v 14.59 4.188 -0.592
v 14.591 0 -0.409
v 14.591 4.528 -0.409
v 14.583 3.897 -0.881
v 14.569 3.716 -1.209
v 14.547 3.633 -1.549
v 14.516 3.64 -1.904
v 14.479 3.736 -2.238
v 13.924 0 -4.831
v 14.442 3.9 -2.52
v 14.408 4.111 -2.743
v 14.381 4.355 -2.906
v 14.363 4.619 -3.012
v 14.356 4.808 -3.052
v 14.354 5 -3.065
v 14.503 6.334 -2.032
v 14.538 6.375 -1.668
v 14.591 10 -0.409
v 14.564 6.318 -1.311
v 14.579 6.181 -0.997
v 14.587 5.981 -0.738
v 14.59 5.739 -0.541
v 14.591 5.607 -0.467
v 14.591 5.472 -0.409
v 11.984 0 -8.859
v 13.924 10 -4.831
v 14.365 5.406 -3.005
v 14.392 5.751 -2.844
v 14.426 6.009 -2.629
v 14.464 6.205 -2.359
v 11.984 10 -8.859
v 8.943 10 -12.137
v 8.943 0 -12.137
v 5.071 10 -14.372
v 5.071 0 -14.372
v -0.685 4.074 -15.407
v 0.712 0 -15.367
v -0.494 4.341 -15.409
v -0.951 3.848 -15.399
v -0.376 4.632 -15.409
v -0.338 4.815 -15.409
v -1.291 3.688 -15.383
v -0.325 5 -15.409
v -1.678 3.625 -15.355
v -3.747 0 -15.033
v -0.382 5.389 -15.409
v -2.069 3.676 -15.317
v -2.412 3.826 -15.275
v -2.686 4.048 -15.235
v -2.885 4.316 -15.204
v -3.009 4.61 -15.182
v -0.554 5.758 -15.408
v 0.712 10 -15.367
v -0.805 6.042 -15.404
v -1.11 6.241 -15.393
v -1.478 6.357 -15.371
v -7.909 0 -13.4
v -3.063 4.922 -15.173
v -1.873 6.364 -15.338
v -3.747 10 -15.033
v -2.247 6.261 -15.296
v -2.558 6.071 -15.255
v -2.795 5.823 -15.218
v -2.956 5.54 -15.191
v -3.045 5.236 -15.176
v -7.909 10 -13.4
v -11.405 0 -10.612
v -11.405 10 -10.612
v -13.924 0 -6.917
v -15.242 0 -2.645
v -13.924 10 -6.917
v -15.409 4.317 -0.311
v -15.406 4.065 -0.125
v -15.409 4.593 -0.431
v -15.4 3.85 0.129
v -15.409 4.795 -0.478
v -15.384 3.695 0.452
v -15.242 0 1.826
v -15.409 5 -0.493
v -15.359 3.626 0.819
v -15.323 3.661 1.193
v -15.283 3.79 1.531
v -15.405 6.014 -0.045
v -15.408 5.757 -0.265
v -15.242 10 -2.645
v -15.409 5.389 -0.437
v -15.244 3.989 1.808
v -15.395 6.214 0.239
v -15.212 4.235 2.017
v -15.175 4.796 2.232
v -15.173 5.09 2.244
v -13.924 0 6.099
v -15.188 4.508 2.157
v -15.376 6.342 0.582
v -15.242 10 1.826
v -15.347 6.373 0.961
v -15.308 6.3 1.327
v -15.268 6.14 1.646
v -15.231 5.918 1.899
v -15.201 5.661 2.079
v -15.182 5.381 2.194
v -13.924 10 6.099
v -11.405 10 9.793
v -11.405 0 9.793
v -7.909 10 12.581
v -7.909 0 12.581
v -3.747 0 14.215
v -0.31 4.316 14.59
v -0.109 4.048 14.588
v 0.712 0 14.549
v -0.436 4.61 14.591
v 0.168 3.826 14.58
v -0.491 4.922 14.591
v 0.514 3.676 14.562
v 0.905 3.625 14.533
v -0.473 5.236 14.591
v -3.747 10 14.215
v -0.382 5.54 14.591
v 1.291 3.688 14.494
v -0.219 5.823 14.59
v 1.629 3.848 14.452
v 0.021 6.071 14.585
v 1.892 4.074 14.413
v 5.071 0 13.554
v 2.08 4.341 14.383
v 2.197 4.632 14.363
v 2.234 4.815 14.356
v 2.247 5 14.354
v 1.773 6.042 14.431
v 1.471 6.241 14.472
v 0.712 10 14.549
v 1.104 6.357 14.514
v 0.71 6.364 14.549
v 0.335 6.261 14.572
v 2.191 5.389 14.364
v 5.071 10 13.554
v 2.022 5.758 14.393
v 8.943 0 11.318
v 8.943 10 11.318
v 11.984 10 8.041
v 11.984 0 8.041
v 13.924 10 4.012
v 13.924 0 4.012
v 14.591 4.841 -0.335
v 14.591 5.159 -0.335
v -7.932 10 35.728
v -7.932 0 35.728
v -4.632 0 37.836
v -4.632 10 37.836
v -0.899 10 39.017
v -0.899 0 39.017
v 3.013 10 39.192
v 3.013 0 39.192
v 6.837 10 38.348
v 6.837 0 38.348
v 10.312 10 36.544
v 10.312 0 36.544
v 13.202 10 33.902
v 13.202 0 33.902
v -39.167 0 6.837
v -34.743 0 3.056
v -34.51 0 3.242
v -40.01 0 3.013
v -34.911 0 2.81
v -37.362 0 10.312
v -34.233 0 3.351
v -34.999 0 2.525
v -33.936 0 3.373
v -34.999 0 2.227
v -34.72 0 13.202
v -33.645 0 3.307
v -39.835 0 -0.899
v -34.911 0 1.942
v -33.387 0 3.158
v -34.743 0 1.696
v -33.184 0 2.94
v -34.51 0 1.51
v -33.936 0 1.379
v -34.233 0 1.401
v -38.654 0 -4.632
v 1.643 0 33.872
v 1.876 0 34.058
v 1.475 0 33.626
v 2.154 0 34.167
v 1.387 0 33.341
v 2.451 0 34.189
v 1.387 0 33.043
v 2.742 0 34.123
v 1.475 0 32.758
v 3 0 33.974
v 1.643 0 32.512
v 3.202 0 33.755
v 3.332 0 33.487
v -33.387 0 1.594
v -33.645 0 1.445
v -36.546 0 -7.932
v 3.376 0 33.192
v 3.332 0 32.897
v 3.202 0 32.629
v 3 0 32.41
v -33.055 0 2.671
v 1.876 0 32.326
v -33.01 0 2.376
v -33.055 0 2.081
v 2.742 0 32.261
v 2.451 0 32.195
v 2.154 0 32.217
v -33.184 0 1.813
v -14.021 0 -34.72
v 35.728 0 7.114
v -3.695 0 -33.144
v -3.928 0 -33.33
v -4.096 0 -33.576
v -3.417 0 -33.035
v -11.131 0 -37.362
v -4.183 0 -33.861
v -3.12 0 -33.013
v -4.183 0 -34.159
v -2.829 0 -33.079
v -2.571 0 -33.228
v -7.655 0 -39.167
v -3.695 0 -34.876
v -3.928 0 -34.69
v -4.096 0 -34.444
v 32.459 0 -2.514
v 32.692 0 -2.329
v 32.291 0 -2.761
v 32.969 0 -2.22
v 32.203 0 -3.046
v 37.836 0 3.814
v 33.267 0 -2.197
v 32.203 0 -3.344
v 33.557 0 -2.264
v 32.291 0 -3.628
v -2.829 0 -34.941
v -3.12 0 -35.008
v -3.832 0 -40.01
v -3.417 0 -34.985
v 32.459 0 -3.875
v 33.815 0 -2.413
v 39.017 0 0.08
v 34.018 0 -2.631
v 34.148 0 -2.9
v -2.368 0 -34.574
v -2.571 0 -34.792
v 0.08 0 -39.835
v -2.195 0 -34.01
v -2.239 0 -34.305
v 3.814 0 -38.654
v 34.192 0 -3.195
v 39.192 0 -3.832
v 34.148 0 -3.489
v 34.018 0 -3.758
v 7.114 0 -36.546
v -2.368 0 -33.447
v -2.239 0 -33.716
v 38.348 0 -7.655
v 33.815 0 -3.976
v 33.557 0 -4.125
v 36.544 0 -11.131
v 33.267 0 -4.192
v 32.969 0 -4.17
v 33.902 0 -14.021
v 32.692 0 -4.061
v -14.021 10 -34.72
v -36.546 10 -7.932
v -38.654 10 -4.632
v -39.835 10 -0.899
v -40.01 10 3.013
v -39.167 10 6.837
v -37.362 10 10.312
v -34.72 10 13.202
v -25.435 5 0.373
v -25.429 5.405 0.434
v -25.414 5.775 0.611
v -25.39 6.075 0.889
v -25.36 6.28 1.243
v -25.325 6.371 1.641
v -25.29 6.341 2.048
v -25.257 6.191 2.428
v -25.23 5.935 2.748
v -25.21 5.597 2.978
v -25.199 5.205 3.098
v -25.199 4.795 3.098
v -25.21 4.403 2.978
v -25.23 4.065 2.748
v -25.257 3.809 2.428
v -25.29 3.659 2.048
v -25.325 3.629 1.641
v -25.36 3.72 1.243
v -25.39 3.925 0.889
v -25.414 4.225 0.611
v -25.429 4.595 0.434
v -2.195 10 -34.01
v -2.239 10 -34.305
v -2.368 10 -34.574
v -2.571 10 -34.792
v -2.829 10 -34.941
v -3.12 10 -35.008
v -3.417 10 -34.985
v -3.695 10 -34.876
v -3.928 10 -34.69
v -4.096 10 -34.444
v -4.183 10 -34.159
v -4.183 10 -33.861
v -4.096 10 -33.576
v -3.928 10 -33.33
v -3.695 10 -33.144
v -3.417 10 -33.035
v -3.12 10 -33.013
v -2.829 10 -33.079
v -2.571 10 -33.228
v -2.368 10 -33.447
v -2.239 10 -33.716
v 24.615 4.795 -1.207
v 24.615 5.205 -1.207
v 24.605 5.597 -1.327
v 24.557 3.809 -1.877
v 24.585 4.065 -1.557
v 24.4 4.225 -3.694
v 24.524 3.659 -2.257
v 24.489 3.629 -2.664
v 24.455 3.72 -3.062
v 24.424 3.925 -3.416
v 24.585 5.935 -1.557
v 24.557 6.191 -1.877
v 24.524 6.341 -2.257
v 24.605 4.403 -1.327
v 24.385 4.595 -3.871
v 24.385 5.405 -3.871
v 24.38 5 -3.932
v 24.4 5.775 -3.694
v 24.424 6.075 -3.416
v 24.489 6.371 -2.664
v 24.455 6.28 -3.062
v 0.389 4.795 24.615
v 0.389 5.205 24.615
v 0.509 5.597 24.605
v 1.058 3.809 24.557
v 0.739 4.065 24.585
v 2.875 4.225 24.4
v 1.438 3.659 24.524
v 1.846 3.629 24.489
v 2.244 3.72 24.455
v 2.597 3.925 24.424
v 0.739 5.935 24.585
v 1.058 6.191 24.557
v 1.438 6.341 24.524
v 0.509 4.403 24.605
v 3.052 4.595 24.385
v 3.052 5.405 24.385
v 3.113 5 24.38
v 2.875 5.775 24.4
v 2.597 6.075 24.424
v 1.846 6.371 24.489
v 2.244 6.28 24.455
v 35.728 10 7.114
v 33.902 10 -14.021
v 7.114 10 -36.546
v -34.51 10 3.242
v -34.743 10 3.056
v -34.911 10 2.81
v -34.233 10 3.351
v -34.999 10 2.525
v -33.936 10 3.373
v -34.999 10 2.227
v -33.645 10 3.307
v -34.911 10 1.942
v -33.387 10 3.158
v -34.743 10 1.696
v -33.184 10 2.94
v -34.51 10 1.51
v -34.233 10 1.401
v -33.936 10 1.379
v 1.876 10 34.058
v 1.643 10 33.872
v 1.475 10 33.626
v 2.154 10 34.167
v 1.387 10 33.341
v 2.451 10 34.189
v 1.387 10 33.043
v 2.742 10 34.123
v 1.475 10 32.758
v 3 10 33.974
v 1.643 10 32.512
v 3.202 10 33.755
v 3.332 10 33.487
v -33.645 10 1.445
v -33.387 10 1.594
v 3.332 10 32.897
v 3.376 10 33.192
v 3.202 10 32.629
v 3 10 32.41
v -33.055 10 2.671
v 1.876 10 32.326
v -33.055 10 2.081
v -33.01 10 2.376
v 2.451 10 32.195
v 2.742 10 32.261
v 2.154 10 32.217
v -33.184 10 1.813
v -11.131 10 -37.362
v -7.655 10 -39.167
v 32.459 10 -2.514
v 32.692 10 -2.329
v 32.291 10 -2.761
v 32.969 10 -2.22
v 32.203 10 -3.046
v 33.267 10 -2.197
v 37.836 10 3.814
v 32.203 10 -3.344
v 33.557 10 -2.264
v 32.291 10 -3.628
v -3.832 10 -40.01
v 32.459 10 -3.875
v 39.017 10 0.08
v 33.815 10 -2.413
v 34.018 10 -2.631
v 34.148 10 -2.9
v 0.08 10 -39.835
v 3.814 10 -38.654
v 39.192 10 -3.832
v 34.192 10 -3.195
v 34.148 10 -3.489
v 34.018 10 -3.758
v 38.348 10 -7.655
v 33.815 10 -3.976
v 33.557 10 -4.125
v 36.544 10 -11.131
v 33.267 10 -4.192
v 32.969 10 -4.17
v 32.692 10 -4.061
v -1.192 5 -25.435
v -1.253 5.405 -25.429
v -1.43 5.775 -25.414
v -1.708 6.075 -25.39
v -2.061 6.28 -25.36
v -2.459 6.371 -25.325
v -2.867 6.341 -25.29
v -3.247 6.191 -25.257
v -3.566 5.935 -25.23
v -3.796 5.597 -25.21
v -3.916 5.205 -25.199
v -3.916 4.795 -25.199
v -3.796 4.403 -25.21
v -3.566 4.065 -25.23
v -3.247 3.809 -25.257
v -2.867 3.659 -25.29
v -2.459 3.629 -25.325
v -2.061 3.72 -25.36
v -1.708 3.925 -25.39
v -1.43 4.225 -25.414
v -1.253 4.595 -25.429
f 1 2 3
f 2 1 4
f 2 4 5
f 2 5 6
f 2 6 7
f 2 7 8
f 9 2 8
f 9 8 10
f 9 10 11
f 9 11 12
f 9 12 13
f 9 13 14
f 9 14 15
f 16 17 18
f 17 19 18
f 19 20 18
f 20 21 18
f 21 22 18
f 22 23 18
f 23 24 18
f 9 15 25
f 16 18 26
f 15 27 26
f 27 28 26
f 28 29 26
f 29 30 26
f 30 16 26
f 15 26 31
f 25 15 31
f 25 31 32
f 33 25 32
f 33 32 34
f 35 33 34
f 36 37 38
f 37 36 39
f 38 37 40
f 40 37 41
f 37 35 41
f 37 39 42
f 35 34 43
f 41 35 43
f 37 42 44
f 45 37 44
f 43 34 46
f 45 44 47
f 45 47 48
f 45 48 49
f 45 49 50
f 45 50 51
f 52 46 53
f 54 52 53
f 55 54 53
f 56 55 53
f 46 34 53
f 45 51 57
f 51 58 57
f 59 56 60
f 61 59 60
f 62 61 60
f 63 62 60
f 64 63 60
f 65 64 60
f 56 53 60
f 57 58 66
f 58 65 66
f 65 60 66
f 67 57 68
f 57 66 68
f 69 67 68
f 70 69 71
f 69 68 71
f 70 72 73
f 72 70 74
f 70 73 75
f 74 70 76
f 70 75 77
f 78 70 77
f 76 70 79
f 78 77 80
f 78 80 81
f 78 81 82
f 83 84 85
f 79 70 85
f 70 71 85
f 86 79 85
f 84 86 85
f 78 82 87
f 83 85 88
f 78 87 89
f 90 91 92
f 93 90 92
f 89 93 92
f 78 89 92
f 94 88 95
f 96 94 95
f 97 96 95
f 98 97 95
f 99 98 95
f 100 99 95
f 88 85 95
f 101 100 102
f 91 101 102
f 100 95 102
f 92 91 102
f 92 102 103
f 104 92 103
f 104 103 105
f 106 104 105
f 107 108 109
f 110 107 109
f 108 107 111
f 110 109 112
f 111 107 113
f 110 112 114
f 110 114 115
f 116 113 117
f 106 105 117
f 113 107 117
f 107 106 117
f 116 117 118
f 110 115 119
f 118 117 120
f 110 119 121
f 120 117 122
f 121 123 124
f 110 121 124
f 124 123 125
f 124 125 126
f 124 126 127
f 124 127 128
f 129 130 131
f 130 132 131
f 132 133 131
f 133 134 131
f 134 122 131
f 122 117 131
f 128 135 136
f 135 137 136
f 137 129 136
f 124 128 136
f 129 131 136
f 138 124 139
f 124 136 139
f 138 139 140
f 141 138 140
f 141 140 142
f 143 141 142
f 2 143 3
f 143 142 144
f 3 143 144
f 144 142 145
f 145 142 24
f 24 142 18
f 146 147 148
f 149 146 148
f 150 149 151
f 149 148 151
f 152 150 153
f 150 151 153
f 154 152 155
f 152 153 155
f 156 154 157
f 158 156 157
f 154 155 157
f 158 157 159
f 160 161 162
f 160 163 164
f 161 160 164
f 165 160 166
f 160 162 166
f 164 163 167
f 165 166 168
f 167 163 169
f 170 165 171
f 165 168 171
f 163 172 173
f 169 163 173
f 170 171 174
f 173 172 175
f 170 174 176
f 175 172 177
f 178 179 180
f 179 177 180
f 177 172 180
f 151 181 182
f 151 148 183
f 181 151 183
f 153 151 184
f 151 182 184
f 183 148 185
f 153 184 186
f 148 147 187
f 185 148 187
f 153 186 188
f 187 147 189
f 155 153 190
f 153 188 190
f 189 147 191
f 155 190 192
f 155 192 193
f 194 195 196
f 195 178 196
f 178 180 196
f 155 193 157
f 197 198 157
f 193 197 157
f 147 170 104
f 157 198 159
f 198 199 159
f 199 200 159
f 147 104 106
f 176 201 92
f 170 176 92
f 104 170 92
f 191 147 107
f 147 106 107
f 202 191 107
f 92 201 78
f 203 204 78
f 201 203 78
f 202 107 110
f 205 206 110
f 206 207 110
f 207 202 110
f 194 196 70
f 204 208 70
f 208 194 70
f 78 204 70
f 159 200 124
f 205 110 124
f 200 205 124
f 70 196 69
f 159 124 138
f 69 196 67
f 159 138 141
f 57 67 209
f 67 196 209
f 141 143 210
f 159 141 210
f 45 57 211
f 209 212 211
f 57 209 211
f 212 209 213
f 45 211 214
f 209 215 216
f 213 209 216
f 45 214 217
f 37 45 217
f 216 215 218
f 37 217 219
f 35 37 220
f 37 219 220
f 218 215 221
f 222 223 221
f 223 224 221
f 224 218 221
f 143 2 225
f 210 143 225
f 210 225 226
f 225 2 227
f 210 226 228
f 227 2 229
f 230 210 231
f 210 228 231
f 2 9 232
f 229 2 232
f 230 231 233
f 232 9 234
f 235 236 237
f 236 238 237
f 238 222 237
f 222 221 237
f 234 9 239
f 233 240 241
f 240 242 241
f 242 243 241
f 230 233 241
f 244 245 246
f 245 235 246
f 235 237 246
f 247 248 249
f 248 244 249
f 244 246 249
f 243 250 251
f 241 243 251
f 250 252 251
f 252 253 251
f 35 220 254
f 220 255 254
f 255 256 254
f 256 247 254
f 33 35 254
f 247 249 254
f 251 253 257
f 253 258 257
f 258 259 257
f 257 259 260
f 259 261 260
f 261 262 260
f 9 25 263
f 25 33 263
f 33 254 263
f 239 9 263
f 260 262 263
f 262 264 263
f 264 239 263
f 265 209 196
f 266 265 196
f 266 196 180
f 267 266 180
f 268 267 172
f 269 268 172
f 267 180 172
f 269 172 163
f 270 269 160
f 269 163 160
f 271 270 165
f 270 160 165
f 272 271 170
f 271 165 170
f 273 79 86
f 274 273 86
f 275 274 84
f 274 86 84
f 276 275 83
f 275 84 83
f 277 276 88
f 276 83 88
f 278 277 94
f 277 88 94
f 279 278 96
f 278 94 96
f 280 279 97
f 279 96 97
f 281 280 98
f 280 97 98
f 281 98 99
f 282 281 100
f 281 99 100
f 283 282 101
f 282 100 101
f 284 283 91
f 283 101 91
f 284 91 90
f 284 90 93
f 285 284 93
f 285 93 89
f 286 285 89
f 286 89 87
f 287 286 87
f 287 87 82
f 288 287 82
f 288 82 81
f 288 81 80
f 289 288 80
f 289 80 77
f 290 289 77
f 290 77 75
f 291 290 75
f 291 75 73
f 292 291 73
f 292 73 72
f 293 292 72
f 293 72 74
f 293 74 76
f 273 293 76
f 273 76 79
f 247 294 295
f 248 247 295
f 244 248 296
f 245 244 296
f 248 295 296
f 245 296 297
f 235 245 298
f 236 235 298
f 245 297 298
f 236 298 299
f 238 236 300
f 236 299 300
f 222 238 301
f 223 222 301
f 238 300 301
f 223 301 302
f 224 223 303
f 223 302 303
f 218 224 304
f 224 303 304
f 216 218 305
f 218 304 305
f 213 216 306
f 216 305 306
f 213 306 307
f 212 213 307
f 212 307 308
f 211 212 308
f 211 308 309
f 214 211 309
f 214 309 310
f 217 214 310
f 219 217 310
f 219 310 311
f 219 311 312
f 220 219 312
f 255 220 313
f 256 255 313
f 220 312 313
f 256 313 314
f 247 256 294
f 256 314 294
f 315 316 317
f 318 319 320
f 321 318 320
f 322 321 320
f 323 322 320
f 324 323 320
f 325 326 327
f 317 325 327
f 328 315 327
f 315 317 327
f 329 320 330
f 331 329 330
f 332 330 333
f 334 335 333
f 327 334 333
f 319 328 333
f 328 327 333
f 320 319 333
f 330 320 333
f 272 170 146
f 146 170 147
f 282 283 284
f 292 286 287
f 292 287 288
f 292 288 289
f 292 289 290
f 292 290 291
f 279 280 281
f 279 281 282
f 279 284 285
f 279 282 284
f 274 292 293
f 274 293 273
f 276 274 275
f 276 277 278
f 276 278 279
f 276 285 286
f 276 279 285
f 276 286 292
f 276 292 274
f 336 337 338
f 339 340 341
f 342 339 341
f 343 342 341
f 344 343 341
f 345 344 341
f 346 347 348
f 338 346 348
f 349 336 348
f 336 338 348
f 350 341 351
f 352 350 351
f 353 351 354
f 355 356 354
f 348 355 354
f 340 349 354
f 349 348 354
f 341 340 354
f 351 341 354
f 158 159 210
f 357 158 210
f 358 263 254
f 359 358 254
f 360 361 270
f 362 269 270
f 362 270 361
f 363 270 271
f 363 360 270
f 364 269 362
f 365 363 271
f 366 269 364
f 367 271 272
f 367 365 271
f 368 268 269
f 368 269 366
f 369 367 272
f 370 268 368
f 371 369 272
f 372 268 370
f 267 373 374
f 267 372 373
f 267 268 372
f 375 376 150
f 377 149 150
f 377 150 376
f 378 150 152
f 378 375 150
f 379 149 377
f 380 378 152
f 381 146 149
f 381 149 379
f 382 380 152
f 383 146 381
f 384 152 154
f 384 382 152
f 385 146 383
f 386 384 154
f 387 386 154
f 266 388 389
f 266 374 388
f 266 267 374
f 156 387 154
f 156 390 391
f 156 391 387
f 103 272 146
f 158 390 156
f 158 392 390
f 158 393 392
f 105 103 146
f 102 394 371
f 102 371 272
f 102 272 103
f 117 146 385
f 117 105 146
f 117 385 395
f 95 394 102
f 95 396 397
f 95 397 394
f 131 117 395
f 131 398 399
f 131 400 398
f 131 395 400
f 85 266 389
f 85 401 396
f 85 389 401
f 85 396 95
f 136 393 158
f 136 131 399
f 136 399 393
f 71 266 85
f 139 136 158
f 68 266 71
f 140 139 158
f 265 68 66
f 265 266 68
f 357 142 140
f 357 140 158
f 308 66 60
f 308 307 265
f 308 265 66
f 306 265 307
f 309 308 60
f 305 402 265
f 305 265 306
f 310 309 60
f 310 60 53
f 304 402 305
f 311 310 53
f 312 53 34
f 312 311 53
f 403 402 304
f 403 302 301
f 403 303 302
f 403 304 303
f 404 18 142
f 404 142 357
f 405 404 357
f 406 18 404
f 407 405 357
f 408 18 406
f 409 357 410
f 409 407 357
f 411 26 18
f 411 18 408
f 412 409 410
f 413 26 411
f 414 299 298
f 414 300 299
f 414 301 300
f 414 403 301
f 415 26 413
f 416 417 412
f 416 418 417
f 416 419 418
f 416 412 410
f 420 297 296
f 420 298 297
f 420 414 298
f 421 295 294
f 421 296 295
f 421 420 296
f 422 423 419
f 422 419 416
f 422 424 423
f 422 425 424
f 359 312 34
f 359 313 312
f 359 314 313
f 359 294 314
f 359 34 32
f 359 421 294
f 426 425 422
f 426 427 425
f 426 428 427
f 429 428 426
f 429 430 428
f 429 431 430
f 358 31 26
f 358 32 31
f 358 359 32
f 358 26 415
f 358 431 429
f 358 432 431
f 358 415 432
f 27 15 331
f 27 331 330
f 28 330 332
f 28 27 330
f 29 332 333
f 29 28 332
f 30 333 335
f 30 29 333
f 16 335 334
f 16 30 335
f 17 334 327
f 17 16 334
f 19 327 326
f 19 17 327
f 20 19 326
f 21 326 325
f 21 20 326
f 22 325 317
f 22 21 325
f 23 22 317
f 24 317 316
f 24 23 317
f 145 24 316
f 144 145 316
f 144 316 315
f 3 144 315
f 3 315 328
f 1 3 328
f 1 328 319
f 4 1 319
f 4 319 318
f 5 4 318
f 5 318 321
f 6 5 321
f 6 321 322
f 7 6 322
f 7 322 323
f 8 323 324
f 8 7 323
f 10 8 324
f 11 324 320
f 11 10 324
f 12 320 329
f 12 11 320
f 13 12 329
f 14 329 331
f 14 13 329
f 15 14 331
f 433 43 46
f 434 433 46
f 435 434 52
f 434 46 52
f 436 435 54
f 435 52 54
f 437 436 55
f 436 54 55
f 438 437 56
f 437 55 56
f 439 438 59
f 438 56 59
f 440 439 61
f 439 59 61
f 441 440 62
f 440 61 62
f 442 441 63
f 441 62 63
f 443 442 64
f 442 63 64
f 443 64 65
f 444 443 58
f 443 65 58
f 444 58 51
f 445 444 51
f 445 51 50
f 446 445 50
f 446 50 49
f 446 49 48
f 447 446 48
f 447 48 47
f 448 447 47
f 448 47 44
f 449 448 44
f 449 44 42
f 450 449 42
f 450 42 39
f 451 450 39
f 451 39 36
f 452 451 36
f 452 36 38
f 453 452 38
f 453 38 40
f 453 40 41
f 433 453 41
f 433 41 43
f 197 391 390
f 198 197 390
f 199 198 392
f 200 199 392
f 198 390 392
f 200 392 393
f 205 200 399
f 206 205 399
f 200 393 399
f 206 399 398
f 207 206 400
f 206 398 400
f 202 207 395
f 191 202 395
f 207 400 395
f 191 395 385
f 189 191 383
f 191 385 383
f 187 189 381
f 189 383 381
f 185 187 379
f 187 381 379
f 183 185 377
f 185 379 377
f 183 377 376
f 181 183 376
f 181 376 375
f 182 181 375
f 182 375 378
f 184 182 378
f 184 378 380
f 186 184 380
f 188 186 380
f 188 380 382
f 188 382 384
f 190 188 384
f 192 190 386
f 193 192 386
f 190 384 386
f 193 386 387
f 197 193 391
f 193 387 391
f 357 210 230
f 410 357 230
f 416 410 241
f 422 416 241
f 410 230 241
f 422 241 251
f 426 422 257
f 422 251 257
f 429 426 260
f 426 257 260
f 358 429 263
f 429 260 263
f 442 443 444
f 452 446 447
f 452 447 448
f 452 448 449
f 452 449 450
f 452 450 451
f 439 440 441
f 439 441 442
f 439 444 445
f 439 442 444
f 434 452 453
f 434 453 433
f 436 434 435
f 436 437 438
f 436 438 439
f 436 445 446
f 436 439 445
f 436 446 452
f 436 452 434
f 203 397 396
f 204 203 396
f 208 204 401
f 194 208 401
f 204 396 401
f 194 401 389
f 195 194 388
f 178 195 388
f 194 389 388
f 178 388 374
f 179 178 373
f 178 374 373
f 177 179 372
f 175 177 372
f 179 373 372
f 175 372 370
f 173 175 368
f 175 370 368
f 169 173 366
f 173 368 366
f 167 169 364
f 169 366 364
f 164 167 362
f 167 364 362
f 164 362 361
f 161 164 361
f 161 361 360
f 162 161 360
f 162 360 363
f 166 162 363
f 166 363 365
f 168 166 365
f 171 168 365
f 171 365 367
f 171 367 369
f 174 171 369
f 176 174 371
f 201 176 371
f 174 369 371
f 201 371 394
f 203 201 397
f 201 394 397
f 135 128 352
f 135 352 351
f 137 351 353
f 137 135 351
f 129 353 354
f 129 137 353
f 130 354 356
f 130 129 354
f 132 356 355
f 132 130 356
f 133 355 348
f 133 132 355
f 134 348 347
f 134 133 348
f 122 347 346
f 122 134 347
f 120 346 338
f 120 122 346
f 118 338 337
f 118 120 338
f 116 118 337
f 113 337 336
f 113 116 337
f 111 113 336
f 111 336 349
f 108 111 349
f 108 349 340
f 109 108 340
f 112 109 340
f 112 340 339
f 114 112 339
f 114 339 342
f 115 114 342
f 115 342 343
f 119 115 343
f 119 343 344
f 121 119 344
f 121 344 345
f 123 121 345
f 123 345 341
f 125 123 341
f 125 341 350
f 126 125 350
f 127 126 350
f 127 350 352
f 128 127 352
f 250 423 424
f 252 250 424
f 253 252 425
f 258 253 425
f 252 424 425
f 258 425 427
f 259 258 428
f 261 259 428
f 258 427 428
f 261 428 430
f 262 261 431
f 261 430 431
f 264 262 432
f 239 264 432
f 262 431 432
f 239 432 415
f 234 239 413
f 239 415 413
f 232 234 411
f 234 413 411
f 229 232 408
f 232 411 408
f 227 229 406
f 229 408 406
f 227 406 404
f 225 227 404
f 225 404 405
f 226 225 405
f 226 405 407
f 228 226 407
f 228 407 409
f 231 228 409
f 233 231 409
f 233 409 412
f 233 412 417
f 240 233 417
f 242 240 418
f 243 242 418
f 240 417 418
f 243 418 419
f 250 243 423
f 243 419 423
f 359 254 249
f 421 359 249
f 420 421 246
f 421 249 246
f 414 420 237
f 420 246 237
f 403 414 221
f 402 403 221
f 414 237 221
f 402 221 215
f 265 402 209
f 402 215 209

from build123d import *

# Parameters (mm, degrees)
SKETCH2_R               = 16.2
BOSS_EXTRUDE2_DEPTH     = 10
SKETCH3_R               = 16.2
SKETCH3_R_2             = 1
CUT_EXTRUDE2_DEPTH      = 10
SKETCH4_R               = 16.2
SKETCH4_R_2             = 15
BOSS_EXTRUDE3_DEPTH     = 10
SKETCH7_R               = 1.375
CUT_EXTRUDE3_DEPTH      = 25
CUT_EXTRUDE3_DEPTH_BACK = 25
SKETCH8_R               = 1.375
CUT_EXTRUDE4_DEPTH      = 25
CUT_EXTRUDE4_DEPTH_BACK = 25


with BuildPart() as part:
    # Sketch2 → Boss-Extrude2 (new body)
    with BuildSketch(Plane(origin=(0, 0, 0), x_dir=(1, 0, 0), z_dir=(0, 1, 0))):
        with BuildLine():
            Line((33.90162956, 14.020502411), (7.113925389, 36.546463106))
            ThreePointArc((7.113925389, 36.546463106), (-3.831561071, 40.010315675), (-14.020502411, 34.720001617))
            Line((-14.020502411, 34.720001617), (-36.546463106, 7.932297446))
            ThreePointArc((-36.546463106, 7.932297446), (-40.010315675, -3.013189014), (-34.720001617, -13.202130354))
            Line((-34.720001617, -13.202130354), (-7.932297446, -35.728091049))
            ThreePointArc((-7.932297446, -35.728091049), (3.013189014, -39.191943618), (13.202130354, -33.90162956))
            Line((13.202130354, -33.90162956), (35.728091049, -7.113925389))
            ThreePointArc((35.728091049, -7.113925389), (39.191943618, 3.831561071), (33.90162956, 14.020502411))
        make_face()
        with Locations((-0.409186029, 0.409186029)):
            Circle(SKETCH2_R, mode=Mode.SUBTRACT)
    extrude(amount=BOSS_EXTRUDE2_DEPTH)

    # Sketch3 → Cut-Extrude2 (cut)
    with BuildSketch(Plane(origin=(0, 10, 0), x_dir=(1, 0, 0), z_dir=(0, 1, 0))):
        with Locations((-0.409186029, 0.409186029)):
            Circle(SKETCH3_R)
        with Locations((-34.010315675, -2.376211247)):
            Circle(SKETCH3_R_2)
        with Locations((-3.194583304, 34.010315675)):
            Circle(SKETCH3_R_2)
        with Locations((33.191943618, 3.194583304)):
            Circle(SKETCH3_R_2)
        with Locations((2.376211247, -33.191943618)):
            Circle(SKETCH3_R_2)
    extrude(amount=-CUT_EXTRUDE2_DEPTH, mode=Mode.SUBTRACT)

    # Sketch4 → Boss-Extrude3 (add)
    with BuildSketch(Plane(origin=(0, 10, 0), x_dir=(1, 0, 0), z_dir=(0, 1, 0))):
        with Locations((-0.409186029, 0.409186029)):
            Circle(SKETCH4_R)
        with Locations((-0.409186029, 0.409186029)):
            Circle(SKETCH4_R_2, mode=Mode.SUBTRACT)
    extrude(amount=-BOSS_EXTRUDE3_DEPTH)

    # Sketch7 → Cut-Extrude3 (cut, two sides)
    with BuildSketch(Plane(origin=(-0.371052455, 0, 0.032066779), x_dir=(-0.08610022, 0, -0.996286481), z_dir=(0.996286481, 0, -0.08610022))) as cut_extrude3_sk:
        with Locations((0.442897516, 5)):
            Circle(SKETCH7_R)
    extrude(amount=CUT_EXTRUDE3_DEPTH, mode=Mode.SUBTRACT)
    extrude(cut_extrude3_sk.sketch, amount=-CUT_EXTRUDE3_DEPTH_BACK, mode=Mode.SUBTRACT)

    # Sketch8 → Cut-Extrude4 (cut, two sides)
    with BuildSketch(Plane(origin=(-0.038133574, 0, -0.441252807), x_dir=(0.996286481, 0, -0.08610022), z_dir=(0.08610022, 0, 0.996286481))) as cut_extrude4_sk:
        with Locations((-0.372435501, 5)):
            Circle(SKETCH8_R)
    extrude(amount=CUT_EXTRUDE4_DEPTH, mode=Mode.SUBTRACT)
    extrude(cut_extrude4_sk.sketch, amount=-CUT_EXTRUDE4_DEPTH_BACK, mode=Mode.SUBTRACT)


solid = part.part
